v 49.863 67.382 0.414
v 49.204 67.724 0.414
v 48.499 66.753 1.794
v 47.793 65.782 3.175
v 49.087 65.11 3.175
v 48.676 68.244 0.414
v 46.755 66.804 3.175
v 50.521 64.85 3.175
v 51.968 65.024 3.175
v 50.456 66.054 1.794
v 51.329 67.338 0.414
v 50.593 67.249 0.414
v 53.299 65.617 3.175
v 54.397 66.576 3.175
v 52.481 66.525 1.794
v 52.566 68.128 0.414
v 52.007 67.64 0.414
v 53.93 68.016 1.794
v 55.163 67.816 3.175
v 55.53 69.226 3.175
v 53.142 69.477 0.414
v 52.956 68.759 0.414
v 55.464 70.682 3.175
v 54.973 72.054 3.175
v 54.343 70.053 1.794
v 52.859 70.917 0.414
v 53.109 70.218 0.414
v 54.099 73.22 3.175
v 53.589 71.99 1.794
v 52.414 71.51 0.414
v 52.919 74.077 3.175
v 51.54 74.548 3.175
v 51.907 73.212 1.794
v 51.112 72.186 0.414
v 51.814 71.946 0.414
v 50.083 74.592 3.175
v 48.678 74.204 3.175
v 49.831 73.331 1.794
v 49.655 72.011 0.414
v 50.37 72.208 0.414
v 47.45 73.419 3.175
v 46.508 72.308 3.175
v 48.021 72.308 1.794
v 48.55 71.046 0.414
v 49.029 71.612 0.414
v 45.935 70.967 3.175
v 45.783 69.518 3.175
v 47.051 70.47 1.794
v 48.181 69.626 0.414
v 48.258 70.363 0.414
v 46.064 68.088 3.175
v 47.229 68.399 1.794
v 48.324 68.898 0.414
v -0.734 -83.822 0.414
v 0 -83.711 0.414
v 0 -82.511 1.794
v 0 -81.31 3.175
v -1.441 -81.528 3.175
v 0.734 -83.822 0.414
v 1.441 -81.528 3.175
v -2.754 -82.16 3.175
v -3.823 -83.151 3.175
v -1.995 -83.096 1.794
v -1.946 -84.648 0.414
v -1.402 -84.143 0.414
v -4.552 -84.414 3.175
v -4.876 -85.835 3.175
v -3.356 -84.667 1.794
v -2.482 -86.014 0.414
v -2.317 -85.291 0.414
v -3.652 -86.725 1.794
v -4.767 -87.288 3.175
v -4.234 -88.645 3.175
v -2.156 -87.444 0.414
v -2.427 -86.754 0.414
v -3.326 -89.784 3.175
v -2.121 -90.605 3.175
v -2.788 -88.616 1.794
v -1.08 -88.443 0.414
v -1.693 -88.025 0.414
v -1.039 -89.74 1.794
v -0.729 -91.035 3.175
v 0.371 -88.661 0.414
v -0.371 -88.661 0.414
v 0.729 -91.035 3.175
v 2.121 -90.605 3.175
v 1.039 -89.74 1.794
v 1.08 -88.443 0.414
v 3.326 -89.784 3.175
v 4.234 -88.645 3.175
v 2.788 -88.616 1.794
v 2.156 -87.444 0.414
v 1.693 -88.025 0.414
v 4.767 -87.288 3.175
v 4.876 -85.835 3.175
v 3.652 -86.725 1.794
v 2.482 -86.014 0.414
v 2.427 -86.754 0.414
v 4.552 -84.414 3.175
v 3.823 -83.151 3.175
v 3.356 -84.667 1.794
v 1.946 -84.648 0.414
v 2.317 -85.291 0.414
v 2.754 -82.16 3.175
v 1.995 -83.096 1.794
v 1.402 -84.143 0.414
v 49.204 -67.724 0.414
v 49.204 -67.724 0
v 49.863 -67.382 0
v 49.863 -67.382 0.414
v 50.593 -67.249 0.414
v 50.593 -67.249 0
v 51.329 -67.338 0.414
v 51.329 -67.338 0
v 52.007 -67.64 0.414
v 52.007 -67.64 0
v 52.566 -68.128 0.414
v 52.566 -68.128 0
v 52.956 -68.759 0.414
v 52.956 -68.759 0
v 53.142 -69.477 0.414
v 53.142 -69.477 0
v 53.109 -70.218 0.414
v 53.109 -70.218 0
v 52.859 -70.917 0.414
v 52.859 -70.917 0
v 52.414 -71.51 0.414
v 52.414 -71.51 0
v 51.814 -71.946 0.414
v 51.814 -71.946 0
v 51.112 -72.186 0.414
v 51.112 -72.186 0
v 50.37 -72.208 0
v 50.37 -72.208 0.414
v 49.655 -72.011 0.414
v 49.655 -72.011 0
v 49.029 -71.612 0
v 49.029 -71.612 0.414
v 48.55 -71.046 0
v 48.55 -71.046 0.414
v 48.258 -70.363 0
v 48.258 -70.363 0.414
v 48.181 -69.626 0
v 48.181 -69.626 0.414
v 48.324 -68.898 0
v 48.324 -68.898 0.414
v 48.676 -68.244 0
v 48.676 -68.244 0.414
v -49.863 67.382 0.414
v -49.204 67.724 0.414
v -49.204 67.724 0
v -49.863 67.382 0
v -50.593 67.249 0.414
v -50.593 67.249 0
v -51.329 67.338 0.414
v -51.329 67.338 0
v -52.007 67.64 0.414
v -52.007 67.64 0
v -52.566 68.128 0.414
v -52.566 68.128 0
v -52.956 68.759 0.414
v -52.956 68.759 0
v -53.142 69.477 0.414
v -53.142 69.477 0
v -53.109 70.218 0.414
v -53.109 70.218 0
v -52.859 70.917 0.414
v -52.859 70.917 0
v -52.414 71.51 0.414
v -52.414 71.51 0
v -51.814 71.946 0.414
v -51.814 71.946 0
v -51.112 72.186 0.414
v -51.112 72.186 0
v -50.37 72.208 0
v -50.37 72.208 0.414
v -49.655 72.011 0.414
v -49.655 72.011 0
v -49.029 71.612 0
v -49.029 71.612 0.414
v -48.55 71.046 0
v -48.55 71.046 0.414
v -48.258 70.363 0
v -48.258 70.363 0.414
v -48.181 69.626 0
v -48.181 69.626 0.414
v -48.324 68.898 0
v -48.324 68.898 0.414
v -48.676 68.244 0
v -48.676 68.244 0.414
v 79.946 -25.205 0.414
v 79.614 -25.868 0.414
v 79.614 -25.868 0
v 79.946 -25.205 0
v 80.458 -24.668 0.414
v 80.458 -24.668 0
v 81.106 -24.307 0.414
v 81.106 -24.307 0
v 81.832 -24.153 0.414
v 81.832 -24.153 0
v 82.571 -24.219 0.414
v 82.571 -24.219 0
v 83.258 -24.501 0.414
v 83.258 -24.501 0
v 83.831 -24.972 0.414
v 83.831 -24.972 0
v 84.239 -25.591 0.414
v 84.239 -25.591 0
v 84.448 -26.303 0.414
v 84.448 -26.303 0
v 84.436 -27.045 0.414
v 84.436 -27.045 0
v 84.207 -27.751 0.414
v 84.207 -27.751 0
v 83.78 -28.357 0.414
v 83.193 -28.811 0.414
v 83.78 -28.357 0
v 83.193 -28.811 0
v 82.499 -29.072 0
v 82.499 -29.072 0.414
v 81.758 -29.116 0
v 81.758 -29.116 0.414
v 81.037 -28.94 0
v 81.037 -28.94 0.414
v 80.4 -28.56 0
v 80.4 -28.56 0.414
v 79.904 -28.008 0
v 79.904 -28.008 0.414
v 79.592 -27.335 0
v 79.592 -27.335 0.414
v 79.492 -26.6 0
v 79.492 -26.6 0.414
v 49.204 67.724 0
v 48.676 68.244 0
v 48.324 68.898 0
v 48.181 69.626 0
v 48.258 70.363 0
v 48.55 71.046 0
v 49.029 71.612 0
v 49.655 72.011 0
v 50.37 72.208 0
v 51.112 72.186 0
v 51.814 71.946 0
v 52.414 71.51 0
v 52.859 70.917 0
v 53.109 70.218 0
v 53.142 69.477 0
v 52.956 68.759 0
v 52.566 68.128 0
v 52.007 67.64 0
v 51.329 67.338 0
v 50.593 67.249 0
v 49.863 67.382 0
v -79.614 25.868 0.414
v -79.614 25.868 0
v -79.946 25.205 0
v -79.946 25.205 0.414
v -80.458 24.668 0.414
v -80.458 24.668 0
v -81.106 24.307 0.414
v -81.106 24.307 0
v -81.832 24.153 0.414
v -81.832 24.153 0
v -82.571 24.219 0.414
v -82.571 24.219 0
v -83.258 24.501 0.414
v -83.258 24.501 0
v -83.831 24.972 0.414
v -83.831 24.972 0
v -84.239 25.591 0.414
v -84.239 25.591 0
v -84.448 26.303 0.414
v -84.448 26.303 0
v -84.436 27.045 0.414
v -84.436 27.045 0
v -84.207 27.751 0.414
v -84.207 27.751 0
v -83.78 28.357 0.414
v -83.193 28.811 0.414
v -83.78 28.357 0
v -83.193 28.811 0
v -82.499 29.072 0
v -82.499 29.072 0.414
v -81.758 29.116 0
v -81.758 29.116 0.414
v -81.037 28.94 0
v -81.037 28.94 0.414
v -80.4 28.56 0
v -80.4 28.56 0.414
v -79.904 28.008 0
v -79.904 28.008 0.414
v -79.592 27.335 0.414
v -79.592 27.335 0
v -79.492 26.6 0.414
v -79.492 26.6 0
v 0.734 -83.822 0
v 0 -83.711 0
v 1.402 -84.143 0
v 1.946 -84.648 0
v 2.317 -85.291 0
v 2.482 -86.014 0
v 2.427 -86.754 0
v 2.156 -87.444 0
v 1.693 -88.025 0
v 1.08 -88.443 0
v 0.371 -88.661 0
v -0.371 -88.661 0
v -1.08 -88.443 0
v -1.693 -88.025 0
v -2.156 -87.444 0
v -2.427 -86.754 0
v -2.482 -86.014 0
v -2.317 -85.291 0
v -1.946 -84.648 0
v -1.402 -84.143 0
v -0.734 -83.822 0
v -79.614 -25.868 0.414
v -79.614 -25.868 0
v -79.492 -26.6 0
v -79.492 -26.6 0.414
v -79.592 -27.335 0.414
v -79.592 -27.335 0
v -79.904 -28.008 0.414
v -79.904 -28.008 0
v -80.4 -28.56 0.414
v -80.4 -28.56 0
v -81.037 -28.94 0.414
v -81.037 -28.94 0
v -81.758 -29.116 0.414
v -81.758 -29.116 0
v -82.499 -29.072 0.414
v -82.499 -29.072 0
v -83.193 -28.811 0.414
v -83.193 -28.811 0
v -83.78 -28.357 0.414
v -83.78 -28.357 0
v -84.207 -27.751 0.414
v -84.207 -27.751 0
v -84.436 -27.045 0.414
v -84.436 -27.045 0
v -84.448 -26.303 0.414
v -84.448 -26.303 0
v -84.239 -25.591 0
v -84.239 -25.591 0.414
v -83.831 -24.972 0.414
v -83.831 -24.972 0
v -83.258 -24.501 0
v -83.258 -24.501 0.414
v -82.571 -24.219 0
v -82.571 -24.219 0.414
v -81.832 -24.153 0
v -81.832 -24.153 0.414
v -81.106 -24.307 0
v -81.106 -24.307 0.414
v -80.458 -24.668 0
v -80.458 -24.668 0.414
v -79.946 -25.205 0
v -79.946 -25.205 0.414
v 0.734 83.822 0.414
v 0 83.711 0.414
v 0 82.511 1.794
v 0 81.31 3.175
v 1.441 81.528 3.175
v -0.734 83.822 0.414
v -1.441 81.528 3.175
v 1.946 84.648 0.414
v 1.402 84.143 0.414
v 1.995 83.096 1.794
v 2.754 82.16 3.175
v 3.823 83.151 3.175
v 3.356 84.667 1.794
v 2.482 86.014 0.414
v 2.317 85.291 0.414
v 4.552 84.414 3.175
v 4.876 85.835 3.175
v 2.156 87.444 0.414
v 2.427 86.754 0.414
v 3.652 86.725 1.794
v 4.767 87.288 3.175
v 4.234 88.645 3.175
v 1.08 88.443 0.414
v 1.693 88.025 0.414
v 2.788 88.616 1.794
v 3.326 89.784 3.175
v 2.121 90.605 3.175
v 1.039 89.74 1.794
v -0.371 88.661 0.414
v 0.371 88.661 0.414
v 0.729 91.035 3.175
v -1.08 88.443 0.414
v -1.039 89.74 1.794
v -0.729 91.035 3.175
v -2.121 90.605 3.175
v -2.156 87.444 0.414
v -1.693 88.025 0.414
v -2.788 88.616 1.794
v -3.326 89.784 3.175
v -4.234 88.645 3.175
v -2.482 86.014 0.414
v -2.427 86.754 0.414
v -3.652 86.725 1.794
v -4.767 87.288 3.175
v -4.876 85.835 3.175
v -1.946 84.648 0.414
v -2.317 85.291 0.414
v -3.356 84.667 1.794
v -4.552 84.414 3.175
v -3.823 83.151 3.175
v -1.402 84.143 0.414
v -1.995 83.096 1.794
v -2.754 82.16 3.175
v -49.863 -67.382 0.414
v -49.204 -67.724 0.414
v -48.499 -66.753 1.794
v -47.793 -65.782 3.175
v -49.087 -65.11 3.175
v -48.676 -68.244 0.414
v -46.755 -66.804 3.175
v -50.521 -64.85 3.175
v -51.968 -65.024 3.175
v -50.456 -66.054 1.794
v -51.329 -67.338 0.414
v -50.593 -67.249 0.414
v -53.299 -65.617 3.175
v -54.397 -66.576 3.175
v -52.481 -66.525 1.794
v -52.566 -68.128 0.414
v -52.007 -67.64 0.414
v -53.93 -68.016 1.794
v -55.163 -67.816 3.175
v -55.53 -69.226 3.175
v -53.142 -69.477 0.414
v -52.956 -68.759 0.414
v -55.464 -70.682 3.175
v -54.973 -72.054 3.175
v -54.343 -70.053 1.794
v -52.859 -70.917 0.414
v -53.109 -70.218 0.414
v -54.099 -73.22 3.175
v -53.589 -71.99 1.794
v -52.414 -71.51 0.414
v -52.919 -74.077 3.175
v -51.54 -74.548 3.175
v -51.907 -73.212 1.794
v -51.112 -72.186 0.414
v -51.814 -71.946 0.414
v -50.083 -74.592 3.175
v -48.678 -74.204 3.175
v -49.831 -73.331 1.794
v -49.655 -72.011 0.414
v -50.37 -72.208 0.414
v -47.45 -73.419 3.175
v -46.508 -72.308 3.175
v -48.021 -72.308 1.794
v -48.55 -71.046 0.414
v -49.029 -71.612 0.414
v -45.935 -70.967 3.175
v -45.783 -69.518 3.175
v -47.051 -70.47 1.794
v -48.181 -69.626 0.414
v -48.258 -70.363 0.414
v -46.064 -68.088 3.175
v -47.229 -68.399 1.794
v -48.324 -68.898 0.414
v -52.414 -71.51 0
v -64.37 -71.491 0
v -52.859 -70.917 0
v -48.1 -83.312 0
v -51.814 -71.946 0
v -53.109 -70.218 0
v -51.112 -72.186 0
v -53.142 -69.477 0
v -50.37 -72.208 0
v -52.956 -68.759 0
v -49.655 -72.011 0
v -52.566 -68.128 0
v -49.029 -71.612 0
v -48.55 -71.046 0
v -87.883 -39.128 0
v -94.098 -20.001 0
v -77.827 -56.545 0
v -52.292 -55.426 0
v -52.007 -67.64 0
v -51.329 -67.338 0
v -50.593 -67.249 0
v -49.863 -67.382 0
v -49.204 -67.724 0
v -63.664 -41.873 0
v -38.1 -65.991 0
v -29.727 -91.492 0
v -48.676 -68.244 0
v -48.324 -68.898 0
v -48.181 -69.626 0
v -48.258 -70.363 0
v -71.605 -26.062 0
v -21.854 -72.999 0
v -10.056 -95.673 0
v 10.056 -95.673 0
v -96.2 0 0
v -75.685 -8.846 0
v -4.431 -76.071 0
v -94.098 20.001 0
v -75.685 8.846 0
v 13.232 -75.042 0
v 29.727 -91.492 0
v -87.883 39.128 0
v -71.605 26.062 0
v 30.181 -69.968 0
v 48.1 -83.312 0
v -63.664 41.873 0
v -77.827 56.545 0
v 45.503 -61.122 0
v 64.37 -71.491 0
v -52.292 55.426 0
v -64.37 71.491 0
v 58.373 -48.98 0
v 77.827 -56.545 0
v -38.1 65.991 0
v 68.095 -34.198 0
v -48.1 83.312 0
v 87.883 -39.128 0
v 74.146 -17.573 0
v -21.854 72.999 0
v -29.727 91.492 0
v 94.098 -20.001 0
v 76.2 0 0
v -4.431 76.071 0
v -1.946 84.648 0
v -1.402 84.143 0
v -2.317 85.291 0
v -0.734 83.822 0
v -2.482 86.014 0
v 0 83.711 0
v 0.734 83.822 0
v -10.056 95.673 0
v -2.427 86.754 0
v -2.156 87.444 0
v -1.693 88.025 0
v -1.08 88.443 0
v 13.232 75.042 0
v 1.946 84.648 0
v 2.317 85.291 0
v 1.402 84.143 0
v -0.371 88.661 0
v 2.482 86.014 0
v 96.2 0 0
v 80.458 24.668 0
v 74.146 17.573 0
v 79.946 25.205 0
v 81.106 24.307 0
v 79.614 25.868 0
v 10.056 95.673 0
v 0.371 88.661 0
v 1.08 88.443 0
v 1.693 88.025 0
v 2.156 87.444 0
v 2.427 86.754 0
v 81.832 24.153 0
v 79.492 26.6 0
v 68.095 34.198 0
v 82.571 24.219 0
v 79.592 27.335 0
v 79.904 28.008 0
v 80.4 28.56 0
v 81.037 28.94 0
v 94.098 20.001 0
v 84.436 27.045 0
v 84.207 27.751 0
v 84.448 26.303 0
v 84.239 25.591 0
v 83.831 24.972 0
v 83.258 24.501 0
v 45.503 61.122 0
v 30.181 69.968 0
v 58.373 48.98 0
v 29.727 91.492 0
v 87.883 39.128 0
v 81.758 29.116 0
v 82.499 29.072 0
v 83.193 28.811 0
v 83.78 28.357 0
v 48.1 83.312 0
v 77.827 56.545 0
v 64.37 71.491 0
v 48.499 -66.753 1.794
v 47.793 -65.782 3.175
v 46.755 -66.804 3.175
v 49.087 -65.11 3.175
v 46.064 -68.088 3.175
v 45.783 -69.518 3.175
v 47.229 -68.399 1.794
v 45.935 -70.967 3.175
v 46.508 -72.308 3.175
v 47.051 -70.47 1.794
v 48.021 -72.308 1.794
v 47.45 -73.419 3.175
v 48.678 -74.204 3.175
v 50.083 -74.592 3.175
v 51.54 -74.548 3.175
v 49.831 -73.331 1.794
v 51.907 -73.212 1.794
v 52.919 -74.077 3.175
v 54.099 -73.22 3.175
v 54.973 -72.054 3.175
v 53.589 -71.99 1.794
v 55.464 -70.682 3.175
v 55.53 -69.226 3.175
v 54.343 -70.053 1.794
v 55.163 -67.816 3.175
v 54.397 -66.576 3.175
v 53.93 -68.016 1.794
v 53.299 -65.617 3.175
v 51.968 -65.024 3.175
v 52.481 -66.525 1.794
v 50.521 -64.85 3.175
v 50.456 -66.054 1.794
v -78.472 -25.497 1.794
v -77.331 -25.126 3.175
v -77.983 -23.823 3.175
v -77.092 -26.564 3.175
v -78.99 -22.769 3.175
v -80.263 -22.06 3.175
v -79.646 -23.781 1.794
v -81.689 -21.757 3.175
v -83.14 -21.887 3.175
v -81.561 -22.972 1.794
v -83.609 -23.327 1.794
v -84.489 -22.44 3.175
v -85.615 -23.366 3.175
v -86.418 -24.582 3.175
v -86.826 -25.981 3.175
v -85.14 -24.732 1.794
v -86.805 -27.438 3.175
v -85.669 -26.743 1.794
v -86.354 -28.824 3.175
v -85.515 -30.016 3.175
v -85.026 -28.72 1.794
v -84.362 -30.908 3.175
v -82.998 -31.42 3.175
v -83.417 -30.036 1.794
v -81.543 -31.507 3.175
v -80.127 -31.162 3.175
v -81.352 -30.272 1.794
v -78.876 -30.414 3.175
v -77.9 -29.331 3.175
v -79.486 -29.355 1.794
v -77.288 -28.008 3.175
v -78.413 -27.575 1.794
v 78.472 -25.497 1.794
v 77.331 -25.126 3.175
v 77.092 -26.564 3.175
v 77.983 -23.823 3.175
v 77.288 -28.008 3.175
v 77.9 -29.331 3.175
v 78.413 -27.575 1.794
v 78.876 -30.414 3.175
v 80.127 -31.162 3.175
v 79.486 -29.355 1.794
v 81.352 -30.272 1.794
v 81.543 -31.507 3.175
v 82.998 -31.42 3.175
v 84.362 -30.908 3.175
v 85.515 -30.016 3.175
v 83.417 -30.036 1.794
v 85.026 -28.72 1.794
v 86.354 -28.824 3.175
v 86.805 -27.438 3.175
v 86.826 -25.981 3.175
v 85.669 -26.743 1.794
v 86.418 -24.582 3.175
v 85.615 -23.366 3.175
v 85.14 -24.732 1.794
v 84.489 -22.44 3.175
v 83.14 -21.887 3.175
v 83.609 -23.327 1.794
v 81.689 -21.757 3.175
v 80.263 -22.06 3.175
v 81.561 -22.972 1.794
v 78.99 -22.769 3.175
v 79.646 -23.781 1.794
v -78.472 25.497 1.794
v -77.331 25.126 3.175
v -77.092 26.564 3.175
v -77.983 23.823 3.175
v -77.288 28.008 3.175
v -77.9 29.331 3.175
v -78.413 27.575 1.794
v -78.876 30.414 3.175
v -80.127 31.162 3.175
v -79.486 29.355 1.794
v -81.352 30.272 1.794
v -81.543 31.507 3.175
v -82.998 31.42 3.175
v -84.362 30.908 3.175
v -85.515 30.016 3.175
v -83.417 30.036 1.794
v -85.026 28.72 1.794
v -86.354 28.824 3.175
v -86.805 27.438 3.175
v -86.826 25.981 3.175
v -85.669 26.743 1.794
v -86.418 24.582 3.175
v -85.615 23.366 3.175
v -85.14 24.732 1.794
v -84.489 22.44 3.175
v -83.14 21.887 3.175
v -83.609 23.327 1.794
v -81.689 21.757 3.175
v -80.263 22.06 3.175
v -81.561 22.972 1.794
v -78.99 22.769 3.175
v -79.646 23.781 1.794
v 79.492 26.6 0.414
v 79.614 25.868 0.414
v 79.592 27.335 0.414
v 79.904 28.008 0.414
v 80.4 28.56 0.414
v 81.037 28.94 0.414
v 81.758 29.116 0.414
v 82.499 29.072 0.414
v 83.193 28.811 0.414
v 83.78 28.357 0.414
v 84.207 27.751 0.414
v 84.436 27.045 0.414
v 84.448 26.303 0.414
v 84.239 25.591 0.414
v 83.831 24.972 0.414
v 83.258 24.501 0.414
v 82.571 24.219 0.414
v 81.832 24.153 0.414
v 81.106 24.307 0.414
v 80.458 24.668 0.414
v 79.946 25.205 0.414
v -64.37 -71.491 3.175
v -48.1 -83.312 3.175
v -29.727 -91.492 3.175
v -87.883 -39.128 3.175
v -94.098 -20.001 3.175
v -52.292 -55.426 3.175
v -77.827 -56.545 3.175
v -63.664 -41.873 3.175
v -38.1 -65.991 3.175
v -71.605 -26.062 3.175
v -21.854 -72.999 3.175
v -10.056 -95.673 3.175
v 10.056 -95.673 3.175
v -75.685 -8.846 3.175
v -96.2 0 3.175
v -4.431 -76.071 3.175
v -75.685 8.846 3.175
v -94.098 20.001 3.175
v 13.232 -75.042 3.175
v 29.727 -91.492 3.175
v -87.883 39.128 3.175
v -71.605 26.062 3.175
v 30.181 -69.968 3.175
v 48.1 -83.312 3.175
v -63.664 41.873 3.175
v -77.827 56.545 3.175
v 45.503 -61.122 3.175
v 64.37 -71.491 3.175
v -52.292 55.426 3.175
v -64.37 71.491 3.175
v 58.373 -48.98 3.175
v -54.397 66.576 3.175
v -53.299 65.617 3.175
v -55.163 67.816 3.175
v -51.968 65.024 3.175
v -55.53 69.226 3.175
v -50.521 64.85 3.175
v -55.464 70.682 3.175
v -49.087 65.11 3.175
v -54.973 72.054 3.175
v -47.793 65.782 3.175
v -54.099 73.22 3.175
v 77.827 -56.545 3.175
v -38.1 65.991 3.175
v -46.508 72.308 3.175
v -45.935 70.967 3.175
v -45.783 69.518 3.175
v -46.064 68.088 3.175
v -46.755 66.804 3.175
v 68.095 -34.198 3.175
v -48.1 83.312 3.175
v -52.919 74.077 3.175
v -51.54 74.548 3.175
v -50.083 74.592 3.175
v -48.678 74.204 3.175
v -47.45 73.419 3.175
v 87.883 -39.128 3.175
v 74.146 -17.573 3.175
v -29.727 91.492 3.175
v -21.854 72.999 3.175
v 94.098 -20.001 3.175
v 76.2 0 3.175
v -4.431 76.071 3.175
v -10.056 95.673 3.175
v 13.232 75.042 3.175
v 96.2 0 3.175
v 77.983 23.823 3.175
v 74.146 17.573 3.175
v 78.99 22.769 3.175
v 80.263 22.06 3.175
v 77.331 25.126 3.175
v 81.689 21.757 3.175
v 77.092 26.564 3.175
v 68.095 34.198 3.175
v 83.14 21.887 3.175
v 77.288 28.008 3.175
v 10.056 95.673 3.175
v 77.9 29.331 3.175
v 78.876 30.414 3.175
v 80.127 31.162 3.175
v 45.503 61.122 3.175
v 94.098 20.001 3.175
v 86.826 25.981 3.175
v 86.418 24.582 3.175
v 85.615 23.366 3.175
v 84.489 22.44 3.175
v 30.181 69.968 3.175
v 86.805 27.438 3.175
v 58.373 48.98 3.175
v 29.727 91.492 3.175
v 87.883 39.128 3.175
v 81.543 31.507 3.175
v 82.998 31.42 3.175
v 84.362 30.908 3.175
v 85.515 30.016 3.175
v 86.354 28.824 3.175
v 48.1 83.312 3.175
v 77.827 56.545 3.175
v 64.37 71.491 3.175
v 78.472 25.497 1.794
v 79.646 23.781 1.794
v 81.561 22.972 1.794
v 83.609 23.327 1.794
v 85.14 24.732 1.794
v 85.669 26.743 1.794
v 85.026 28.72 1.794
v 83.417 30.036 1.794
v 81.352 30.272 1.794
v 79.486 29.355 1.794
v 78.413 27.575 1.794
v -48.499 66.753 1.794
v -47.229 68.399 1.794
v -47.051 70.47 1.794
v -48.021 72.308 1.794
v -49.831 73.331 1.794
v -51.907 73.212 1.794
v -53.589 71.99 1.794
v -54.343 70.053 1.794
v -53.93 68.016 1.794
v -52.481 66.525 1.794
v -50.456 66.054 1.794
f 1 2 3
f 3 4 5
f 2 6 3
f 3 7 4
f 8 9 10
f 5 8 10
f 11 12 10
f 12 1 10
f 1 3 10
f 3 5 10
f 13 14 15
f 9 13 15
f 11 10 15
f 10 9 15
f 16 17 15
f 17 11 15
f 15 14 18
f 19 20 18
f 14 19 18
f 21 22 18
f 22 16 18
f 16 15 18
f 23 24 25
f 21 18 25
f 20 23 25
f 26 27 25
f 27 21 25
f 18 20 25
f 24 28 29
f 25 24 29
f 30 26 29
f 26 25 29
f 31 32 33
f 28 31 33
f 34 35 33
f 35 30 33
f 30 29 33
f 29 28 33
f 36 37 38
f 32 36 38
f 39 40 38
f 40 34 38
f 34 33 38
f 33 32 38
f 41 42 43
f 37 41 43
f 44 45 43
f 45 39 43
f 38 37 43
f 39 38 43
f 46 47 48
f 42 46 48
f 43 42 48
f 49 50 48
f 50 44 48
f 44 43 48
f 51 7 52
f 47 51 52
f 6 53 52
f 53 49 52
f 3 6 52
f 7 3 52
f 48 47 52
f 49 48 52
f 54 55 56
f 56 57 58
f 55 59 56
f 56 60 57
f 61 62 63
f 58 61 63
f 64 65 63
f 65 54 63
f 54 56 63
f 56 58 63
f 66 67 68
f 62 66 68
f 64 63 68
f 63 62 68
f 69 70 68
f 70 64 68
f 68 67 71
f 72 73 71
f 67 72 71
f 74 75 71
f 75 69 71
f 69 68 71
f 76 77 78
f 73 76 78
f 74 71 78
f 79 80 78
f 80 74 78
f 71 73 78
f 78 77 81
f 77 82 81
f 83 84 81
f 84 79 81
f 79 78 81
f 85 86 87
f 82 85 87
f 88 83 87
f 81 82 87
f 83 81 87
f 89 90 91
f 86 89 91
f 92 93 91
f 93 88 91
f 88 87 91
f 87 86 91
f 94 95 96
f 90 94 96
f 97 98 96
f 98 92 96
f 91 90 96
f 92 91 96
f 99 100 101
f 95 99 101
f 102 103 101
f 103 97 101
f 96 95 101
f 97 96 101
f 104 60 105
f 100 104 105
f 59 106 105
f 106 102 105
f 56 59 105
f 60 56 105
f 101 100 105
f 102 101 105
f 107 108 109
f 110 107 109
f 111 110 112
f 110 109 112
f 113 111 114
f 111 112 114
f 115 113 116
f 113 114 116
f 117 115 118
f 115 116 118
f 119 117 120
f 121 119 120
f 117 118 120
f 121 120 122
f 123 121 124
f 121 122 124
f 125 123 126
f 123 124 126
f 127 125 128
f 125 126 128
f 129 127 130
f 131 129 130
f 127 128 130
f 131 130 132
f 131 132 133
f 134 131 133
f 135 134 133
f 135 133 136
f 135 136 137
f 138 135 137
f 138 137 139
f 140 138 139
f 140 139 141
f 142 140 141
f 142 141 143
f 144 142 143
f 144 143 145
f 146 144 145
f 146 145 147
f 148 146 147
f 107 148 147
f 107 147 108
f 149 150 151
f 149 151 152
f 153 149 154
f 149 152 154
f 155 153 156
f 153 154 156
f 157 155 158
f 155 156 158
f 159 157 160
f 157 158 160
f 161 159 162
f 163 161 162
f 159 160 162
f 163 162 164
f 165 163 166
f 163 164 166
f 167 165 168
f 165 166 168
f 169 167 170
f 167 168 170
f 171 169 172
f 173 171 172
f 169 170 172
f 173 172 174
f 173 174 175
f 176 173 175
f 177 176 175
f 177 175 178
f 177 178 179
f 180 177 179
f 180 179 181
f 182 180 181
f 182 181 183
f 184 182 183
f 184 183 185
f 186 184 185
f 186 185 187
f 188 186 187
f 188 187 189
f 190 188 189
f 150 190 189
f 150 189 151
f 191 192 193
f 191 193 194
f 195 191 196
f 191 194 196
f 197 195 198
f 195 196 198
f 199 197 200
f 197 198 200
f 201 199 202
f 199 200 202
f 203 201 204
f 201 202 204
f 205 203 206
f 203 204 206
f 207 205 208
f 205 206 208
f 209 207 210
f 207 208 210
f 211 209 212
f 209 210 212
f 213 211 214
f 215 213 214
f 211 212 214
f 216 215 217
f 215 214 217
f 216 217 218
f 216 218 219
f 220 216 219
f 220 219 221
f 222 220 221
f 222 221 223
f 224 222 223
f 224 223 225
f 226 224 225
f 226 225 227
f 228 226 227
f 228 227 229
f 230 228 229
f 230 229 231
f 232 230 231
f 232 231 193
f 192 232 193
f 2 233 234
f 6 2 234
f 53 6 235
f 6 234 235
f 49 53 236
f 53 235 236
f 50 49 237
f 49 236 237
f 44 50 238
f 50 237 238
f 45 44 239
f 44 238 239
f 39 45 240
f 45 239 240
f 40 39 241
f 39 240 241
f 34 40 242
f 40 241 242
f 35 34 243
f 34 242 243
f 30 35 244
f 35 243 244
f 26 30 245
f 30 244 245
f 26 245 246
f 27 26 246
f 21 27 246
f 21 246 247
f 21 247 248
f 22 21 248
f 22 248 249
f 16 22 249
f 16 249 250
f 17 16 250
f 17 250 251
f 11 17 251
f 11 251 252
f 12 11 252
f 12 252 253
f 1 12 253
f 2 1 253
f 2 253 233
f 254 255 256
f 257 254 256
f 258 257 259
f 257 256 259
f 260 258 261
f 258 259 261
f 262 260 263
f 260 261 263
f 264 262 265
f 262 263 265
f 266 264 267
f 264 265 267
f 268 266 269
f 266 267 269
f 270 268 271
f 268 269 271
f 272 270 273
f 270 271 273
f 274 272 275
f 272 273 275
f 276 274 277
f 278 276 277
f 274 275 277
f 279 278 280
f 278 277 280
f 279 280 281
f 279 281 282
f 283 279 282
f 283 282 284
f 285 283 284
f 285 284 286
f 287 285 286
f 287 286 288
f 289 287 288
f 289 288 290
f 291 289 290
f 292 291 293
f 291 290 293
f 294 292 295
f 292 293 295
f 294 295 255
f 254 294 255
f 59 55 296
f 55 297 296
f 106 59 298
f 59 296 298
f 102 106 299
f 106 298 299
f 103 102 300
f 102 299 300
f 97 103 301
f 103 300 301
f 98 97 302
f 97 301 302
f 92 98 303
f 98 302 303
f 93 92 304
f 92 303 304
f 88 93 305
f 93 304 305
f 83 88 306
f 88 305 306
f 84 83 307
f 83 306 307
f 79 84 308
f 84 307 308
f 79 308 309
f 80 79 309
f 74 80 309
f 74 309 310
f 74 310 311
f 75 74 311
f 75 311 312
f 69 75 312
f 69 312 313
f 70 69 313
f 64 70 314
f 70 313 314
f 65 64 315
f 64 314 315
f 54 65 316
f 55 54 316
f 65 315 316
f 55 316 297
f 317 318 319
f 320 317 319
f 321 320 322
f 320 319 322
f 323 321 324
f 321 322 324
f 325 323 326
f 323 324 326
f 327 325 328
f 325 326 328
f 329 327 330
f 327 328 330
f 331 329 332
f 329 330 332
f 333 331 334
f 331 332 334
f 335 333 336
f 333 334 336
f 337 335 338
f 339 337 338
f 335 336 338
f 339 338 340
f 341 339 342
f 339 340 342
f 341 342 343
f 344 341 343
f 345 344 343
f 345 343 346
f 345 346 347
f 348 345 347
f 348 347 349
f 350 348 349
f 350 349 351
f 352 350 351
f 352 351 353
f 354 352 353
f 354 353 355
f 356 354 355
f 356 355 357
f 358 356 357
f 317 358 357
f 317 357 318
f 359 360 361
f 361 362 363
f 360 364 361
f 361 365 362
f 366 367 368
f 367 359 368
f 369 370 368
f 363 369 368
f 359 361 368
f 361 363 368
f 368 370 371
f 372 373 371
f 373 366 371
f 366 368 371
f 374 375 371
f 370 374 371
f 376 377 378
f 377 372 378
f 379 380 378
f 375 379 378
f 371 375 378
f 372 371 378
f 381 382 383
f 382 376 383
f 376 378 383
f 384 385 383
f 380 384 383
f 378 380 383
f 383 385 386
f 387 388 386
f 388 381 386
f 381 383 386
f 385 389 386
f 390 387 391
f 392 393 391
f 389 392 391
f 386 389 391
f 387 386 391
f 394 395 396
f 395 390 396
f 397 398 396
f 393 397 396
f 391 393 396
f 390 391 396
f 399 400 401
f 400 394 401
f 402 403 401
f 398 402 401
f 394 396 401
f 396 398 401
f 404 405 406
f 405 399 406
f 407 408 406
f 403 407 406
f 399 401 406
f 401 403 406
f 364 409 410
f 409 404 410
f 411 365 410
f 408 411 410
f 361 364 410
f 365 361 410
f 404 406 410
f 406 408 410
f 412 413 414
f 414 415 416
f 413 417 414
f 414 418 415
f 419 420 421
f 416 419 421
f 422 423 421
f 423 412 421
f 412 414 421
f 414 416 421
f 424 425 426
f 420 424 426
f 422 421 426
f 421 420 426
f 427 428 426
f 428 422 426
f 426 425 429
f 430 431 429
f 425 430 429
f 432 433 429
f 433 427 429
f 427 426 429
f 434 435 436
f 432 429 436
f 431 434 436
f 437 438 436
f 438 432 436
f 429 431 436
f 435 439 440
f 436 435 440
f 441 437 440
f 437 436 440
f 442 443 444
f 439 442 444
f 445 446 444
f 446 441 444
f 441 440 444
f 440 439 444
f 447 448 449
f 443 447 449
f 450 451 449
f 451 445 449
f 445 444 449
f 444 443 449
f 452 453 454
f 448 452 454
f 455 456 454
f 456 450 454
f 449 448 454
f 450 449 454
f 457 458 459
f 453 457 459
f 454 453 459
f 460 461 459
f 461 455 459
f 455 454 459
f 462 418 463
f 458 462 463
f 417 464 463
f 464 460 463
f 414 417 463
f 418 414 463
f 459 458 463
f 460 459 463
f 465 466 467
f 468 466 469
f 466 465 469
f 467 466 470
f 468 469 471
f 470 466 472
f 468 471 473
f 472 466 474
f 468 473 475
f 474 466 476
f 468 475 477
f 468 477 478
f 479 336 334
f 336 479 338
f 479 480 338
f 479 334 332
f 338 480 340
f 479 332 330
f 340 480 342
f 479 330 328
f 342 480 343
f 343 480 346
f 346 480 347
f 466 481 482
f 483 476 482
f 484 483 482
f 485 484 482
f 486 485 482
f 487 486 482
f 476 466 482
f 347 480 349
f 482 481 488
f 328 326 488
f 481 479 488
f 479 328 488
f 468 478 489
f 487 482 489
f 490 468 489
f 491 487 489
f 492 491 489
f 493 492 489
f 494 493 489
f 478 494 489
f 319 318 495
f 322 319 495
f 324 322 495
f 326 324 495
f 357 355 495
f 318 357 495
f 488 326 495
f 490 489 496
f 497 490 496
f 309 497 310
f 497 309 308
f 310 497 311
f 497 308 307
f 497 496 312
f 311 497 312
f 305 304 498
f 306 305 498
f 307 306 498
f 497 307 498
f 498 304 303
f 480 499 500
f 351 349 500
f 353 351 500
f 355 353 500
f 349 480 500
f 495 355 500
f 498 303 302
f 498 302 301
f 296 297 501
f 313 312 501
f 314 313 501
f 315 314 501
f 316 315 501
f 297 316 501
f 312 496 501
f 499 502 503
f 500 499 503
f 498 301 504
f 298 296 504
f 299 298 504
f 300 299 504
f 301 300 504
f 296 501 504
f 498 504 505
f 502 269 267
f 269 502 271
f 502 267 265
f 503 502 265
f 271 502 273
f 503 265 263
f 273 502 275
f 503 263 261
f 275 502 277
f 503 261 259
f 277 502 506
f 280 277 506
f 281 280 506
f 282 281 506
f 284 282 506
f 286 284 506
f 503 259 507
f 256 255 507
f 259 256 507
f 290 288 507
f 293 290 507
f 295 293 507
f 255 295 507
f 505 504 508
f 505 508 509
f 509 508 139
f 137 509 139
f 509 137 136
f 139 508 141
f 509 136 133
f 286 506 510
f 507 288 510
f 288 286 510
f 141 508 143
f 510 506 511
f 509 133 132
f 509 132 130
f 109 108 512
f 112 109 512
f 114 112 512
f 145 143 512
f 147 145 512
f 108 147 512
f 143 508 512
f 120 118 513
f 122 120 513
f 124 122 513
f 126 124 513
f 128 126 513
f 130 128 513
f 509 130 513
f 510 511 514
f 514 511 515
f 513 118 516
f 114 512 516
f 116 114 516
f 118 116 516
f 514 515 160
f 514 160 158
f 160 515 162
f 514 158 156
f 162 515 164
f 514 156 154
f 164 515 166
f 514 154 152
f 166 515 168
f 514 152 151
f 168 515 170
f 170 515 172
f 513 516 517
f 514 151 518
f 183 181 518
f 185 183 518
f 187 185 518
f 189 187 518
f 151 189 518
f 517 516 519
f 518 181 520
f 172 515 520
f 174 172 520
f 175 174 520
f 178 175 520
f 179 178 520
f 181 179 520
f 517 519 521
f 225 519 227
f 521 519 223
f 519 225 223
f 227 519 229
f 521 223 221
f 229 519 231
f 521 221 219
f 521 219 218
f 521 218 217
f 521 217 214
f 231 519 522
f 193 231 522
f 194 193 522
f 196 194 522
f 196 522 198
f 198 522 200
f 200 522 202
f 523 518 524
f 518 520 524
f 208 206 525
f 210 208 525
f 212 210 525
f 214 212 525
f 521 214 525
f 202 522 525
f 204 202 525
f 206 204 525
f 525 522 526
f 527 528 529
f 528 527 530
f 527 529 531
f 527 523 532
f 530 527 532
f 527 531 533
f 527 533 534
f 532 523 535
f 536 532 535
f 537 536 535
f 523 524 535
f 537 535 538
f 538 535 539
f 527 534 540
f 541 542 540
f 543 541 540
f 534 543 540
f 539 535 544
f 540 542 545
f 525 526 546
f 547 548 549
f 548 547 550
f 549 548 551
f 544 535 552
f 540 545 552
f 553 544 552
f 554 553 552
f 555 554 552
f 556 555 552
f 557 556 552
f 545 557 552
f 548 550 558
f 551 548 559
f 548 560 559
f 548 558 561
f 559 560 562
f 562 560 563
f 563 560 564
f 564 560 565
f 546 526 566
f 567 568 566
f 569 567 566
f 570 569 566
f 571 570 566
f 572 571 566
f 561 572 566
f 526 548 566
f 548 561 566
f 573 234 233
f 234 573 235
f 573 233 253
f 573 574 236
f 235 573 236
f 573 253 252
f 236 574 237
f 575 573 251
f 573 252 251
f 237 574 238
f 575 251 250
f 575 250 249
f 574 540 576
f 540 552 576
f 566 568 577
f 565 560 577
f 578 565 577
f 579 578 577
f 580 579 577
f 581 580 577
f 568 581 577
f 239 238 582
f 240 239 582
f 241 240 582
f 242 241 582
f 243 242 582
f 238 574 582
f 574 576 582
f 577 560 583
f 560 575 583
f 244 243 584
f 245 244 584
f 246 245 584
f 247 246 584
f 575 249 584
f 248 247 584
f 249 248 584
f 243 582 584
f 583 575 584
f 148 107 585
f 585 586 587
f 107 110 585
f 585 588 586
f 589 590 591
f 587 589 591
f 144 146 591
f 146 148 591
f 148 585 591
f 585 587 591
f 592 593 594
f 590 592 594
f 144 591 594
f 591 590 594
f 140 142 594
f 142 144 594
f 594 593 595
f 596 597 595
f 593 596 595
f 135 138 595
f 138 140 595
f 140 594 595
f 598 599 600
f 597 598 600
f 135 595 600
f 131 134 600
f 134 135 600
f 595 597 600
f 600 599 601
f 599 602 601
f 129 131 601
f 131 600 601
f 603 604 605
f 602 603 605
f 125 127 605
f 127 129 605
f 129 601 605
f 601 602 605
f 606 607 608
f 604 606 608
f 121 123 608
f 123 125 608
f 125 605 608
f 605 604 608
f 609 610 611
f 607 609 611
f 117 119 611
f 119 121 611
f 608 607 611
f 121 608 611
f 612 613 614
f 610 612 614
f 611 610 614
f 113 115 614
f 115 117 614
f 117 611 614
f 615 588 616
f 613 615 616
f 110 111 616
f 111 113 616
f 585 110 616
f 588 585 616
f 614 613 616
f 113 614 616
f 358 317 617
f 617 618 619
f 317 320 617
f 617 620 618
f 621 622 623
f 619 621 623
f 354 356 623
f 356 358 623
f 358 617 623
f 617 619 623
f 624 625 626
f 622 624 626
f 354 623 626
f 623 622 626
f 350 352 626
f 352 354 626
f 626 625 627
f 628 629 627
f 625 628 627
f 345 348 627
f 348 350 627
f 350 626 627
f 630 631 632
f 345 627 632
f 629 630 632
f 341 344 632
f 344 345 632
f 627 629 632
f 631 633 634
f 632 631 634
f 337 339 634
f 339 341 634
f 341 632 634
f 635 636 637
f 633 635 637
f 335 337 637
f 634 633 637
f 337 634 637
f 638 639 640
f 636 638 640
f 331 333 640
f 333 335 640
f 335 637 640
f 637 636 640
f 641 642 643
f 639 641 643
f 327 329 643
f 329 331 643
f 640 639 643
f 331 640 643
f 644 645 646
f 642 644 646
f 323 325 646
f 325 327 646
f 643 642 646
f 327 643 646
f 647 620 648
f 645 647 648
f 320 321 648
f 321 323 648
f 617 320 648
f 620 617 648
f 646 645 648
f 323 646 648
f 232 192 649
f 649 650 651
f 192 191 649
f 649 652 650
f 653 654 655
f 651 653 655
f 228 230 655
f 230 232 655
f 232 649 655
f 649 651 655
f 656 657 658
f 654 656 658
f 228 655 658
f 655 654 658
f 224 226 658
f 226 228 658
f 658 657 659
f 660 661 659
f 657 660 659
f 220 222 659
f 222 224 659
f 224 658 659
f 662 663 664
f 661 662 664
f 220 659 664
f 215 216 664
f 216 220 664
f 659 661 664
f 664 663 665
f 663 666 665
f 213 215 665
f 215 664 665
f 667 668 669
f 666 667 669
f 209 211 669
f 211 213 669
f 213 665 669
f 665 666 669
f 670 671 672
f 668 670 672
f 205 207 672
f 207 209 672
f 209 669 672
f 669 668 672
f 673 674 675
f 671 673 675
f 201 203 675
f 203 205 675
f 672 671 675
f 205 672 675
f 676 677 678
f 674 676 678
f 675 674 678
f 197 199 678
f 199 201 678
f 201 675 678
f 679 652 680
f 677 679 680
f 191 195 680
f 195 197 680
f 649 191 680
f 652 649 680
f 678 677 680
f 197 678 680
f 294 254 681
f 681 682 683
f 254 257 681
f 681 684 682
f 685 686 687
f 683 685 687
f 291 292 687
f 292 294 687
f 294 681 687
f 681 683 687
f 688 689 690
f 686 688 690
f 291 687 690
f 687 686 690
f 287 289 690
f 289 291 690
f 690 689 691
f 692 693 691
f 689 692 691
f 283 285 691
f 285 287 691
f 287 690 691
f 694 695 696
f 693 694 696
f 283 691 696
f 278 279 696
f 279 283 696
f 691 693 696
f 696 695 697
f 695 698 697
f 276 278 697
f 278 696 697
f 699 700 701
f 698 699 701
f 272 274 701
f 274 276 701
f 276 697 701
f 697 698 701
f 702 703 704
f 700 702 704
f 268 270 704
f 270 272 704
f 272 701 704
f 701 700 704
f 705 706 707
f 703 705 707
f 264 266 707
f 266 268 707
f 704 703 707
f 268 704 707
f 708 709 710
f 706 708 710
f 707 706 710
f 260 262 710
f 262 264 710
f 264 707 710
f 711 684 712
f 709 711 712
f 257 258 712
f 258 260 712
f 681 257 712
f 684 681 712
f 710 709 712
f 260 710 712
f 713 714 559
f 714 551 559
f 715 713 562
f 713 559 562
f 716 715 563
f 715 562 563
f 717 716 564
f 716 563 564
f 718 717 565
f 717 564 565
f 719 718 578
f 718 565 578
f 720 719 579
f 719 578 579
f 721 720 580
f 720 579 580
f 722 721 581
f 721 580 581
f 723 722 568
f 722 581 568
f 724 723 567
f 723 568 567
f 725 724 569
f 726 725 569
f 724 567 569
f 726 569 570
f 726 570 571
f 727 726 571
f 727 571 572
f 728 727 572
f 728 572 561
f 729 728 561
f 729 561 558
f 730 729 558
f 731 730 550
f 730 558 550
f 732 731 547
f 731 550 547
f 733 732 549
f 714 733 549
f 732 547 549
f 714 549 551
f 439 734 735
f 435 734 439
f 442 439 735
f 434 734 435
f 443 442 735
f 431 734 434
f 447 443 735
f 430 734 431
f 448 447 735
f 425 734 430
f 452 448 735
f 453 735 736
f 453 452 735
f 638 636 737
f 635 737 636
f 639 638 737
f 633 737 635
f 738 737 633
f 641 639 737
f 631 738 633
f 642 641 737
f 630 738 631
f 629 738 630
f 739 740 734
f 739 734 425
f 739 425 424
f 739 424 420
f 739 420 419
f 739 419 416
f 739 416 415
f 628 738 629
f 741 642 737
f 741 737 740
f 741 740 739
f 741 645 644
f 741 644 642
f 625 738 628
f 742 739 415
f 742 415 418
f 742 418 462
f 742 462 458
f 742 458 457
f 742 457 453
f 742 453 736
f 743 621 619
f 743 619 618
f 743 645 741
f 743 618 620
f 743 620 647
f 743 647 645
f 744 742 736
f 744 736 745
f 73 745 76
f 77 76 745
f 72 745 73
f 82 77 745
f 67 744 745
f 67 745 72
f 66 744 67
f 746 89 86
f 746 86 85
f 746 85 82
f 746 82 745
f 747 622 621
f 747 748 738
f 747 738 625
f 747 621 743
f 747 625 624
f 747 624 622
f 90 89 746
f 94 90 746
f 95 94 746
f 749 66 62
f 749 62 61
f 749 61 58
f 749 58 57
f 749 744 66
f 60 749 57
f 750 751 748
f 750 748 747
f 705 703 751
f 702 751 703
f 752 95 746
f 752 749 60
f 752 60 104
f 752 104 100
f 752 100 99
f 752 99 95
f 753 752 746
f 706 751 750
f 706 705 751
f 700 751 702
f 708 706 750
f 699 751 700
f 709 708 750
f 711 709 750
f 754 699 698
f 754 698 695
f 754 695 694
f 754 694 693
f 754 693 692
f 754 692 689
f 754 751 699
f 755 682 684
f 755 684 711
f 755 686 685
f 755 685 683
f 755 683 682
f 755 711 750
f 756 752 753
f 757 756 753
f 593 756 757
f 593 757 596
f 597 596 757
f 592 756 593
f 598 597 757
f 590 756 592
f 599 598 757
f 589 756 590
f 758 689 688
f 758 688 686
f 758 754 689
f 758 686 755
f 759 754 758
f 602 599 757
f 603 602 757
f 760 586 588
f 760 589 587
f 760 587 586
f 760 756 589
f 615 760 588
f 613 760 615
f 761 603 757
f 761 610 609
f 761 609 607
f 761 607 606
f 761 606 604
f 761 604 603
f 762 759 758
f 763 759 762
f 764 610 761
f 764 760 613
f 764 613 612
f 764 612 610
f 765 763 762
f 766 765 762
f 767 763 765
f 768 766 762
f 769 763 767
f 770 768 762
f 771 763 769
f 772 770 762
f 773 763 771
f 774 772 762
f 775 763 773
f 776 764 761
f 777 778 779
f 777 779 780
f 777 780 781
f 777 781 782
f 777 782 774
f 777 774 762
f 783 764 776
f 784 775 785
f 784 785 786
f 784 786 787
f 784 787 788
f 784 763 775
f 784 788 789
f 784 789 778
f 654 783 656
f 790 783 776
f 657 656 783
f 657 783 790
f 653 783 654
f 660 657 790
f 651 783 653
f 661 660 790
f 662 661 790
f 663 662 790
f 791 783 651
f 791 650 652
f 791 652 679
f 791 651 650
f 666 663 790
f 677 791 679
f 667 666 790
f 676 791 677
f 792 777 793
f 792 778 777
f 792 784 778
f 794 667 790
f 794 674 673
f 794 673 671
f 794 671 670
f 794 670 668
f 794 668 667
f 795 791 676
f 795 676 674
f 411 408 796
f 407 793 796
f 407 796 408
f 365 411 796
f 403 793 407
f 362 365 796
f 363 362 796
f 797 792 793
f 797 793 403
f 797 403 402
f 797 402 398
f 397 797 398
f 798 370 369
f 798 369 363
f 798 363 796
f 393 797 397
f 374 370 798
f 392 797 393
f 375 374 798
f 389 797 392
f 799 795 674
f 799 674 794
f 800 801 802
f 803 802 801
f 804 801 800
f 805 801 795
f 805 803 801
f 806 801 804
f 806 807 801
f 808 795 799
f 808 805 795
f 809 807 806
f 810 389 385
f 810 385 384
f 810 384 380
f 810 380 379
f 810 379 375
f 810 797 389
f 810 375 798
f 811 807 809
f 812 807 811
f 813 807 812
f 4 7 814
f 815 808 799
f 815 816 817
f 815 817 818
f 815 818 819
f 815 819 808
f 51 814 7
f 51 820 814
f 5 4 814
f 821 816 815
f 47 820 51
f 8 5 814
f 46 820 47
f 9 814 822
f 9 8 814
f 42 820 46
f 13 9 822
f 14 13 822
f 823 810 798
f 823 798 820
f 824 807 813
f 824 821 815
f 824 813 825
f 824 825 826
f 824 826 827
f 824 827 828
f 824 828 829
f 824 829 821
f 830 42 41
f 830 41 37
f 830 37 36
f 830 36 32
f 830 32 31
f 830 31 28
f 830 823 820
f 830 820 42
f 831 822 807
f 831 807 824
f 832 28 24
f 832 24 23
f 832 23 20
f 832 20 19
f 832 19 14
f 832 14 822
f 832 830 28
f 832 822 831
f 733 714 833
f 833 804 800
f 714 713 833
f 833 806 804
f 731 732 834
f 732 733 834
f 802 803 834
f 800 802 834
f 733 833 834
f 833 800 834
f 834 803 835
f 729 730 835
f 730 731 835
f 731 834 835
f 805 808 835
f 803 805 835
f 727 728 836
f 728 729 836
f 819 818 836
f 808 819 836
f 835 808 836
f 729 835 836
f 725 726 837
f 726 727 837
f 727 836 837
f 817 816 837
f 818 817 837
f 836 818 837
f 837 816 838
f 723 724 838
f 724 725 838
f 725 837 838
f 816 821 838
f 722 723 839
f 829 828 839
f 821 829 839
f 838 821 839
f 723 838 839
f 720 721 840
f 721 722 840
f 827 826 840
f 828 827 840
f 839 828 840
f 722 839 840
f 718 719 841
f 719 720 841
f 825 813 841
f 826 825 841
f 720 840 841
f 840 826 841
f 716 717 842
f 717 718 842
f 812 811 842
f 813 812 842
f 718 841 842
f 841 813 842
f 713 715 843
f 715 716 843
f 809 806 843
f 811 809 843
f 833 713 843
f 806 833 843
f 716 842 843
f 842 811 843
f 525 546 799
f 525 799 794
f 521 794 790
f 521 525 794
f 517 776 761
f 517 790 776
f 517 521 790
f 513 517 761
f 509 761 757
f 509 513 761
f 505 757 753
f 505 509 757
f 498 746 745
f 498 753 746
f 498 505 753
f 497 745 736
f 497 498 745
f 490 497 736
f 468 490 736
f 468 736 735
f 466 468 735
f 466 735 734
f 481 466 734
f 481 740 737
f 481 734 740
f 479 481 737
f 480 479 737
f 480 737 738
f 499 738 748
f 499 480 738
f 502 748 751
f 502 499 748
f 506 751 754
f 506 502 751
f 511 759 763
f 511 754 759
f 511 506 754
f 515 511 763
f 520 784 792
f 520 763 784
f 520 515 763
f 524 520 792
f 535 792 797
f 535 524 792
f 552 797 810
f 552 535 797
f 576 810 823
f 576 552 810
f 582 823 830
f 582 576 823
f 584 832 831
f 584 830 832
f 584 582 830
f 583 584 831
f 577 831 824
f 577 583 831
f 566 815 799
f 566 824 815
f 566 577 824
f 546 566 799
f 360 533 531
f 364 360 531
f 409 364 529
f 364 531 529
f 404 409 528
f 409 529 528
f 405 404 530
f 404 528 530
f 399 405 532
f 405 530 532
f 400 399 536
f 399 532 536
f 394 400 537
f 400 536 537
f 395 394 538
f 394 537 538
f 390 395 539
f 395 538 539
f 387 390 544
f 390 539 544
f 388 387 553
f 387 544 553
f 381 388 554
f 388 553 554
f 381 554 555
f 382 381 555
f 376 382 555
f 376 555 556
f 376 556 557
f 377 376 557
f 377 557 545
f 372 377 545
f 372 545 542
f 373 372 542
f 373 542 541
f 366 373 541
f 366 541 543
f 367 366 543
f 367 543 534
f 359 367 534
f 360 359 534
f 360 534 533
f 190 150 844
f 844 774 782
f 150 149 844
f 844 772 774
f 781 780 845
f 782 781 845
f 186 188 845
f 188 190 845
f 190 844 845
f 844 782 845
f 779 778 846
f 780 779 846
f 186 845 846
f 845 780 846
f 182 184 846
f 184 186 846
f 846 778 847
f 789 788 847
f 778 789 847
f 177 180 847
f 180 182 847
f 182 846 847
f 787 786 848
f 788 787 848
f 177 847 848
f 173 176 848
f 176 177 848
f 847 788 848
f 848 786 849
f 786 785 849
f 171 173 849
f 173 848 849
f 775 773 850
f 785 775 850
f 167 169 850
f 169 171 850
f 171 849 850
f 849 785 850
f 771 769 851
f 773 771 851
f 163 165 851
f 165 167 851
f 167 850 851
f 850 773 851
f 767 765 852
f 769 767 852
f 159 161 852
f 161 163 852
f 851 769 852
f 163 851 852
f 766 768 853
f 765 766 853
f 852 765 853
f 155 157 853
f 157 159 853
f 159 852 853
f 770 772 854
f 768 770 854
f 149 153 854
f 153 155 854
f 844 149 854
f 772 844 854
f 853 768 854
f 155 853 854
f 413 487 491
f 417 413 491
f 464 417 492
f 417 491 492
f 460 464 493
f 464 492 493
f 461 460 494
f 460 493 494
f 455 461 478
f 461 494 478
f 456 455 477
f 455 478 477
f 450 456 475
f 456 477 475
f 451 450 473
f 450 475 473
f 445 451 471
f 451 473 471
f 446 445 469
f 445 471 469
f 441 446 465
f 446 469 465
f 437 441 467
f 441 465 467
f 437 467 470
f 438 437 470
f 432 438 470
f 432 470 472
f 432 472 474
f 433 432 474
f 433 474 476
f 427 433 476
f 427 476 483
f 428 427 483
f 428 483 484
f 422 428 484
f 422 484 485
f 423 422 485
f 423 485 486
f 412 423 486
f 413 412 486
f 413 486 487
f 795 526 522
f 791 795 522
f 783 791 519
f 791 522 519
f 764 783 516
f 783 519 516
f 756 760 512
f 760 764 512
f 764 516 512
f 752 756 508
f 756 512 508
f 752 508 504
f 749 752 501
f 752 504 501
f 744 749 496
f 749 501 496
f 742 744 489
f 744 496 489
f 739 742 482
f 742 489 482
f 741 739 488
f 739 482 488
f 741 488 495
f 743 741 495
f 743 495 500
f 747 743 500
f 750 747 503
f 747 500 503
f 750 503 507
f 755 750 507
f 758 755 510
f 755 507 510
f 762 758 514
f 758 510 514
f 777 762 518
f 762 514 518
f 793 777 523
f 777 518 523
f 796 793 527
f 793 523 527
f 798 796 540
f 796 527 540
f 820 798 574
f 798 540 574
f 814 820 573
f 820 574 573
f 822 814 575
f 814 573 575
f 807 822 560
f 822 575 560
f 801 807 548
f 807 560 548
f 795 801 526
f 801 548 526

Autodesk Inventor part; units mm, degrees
ref_plane "YZ Plane" through (0, 0, 0) normal (1, 0, 0) x (0, 1, 0)
ref_plane "XZ Plane" through (0, 0, 0) normal (0, 1, 0) x (-1, 0, 0)
ref_plane "XY Plane" through (0, 0, 0) normal (0, 0, 1) x (1, 0, 0)
sketch "Sketch1" plane through (0, 0, 0) normal (0, 0, 1) x (1, 0, 0)
  circle A0 centre (0, 0) radius 76.2
  circle A1 centre (0, 0) radius 96.2
  dimension "d0" = 152.4
  dimension "d1" = 20
extrude "Extrusion1" add sketch "Sketch1" along normal blind 3.175
sketch "Sketch2" plane through (0, 0, 3.175) normal (0, 0, 1) x (1, 0, 0)
  circle A0 centre (0, 0) radius 76.2 projected
  circle A1 centre (0, 0) radius 96.2 projected
  circle A2 centre (0, 0) radius 76.2 projected
  line L0 (0, 76.2) -> (0, 96.2)
  point P0 (0, 86.2)
  point P1 (0, 86.2)
hole "Hole1" at (0, 86.2, 3.175) direction (0, 0, -1) diameter 4.978 depth 8 tip angle 118 countersink diameter 9.779 countersink angle 82 clearance for "Flat Head Machine Screw (82)" size "#10" standard "Ansi Unified Screw Threads"
pattern_circular "Circular Pattern1" count 10 over 360 about axis through (0, 0, 0) along (0, 0, 1) of "Hole1"
properties part number "1134_RU O Ring Cap_V1" material "Aluminum 6061"
